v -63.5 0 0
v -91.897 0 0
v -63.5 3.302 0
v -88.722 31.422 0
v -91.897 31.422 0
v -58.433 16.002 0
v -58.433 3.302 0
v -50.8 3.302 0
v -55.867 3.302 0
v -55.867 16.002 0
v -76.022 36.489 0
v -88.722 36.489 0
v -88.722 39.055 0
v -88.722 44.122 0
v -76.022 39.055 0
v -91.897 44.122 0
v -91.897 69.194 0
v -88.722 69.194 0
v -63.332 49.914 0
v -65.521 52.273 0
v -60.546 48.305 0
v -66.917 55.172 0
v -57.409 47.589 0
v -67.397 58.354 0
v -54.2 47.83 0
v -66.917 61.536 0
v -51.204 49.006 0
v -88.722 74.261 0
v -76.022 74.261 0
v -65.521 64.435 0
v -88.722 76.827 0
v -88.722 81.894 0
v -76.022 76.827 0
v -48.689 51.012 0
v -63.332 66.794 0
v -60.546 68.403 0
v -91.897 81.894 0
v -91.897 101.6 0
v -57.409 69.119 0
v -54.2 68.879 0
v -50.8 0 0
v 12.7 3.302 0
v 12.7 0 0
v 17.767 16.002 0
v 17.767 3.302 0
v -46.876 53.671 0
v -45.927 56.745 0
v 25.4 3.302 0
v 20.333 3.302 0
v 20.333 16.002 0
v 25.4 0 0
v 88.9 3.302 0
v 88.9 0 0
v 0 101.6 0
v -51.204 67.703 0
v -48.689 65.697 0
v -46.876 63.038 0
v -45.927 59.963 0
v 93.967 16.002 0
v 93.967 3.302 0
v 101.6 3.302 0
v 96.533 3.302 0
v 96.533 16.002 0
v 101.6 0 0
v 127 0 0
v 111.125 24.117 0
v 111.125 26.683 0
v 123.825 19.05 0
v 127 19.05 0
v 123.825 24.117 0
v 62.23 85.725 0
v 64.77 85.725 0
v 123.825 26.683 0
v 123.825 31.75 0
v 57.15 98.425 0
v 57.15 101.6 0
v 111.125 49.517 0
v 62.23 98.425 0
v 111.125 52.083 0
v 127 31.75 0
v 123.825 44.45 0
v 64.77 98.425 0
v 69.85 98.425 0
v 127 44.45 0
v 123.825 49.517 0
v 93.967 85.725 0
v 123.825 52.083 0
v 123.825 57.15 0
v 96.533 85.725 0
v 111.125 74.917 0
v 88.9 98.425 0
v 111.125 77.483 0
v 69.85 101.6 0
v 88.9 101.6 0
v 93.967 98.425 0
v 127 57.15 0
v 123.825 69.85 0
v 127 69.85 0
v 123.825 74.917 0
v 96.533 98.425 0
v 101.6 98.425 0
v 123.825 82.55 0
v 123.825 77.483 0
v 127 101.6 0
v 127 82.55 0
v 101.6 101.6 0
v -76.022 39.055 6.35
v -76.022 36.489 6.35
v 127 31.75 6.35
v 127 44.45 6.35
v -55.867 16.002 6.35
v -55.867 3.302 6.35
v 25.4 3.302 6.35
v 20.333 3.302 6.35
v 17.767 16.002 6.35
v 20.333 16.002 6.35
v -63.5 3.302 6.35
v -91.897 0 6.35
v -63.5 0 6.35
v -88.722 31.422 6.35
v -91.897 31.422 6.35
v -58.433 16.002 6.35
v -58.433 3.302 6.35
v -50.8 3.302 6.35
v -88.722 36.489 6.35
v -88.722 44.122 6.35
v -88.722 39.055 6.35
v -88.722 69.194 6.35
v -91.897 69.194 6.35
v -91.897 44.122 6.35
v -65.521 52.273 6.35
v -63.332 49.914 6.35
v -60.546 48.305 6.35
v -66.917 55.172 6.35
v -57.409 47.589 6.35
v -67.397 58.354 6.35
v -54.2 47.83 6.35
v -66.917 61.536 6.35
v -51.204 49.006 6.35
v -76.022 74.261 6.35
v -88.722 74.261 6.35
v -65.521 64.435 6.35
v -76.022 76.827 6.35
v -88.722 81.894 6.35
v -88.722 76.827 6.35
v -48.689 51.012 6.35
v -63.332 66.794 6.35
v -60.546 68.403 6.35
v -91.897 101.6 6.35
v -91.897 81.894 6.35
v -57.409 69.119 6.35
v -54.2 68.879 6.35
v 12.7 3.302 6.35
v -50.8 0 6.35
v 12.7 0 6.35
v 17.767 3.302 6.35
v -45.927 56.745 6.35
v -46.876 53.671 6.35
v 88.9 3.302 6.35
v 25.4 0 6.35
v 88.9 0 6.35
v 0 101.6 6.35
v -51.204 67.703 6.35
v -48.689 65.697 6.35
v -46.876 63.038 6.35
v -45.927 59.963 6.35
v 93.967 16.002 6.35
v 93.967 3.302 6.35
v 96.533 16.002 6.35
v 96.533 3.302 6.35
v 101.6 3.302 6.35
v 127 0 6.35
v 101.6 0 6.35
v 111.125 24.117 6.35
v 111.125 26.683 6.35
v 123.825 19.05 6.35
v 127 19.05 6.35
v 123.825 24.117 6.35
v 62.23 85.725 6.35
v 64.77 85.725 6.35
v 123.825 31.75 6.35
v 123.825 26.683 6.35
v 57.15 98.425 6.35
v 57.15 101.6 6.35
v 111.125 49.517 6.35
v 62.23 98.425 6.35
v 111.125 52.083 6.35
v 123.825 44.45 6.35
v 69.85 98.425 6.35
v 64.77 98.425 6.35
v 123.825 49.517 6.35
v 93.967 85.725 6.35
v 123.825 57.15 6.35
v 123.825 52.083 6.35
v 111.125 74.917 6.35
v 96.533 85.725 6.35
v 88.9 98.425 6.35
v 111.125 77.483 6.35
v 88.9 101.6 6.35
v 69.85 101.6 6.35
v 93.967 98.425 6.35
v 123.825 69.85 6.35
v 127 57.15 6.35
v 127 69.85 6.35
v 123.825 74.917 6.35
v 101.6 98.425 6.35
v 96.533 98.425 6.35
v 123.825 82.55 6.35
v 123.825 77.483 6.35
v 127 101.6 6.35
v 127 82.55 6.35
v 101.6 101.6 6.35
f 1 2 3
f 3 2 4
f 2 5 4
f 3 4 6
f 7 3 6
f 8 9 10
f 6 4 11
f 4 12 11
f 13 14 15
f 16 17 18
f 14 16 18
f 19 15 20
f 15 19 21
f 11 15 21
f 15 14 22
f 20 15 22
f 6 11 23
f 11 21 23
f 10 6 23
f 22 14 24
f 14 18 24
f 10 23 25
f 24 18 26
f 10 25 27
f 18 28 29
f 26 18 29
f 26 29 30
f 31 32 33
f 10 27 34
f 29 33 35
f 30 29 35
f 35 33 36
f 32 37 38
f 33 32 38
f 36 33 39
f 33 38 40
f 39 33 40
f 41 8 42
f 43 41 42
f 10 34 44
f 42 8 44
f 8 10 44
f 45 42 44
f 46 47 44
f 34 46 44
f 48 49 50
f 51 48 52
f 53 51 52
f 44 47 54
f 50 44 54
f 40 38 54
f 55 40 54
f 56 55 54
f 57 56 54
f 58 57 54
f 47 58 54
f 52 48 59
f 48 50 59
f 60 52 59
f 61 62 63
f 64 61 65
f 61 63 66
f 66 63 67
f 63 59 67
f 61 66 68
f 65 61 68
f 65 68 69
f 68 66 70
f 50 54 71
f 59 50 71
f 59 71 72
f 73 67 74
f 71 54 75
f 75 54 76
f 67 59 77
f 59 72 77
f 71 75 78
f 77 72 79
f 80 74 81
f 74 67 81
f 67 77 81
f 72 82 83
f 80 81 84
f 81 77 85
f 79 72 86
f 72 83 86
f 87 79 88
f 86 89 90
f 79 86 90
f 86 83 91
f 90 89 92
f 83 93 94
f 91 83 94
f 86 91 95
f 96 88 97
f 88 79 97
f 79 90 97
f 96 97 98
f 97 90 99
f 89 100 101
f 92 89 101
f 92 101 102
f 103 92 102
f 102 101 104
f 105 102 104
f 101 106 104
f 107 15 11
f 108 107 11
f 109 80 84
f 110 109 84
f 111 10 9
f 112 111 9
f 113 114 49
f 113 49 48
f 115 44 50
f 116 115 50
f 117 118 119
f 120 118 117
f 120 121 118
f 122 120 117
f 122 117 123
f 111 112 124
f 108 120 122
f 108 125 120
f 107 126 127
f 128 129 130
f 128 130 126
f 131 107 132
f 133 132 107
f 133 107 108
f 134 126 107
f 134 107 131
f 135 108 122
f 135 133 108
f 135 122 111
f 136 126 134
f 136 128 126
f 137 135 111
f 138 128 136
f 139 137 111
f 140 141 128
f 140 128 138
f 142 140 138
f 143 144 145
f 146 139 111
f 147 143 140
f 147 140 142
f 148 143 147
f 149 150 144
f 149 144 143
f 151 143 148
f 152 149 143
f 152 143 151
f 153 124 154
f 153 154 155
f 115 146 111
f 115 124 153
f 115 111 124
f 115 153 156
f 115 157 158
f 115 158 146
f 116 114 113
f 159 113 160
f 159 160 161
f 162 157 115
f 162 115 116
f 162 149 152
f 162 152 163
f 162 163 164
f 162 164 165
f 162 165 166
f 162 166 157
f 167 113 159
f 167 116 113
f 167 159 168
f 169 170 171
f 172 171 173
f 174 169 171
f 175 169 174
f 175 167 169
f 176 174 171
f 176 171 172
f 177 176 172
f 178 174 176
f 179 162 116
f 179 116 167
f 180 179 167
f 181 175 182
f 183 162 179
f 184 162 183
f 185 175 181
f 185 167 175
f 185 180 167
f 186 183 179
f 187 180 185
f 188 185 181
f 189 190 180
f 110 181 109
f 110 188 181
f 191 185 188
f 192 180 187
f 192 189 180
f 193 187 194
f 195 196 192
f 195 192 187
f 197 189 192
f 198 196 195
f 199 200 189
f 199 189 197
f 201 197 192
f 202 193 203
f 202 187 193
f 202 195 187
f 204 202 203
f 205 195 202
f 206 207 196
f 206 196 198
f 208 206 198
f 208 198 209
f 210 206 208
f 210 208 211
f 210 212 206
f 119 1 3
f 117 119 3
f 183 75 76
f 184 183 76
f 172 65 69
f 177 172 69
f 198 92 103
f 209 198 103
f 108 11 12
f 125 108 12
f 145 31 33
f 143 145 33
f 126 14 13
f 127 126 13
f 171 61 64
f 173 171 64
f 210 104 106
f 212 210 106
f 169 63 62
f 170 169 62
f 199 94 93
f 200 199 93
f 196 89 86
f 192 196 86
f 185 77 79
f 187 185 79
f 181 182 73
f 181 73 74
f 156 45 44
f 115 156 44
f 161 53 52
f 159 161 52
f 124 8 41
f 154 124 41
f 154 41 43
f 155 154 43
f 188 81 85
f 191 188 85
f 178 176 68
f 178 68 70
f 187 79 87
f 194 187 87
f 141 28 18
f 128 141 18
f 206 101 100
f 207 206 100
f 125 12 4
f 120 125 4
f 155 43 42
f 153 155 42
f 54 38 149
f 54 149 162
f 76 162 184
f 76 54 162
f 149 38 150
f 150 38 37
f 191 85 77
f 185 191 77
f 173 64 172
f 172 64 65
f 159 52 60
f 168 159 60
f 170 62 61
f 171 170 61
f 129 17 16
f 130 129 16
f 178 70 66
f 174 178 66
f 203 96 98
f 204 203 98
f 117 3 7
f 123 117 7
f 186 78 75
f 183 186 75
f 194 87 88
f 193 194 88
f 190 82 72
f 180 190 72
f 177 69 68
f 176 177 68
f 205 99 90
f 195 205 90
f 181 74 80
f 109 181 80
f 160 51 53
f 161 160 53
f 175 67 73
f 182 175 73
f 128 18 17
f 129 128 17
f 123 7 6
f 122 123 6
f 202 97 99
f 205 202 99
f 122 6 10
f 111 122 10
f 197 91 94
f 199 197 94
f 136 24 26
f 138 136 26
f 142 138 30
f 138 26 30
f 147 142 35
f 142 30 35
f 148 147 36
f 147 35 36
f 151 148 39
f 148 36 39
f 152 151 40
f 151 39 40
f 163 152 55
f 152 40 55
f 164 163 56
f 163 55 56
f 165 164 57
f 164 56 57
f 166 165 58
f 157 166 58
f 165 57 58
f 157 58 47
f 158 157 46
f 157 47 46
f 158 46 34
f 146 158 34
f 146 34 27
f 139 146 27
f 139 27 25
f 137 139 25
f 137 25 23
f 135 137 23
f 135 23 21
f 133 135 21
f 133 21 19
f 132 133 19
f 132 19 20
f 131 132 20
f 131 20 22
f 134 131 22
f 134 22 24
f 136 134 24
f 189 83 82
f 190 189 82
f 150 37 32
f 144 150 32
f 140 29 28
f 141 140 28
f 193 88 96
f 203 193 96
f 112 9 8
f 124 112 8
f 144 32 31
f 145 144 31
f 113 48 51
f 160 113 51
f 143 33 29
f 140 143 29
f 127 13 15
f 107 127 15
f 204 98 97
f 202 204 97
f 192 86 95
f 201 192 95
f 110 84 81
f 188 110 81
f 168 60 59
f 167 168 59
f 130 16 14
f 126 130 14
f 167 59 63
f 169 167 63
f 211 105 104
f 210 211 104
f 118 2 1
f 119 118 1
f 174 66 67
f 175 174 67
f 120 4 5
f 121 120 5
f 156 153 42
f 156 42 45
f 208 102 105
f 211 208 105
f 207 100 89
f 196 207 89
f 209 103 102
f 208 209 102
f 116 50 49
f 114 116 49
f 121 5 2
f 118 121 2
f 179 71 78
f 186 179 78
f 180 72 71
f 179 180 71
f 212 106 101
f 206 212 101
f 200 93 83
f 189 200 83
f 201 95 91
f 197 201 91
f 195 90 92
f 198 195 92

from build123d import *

# Parameters (mm, degrees)
BOSS_EXTRUDE1_DEPTH     = 6.35
CUT_EXTRUDE4_DEPTH      = 127
CUT_EXTRUDE4_DEPTH_BACK = 127
CUT_EXTRUDE5_DEPTH      = 127
CUT_EXTRUDE5_DEPTH_BACK = 127
CUT_EXTRUDE7_DEPTH      = 127
CUT_EXTRUDE7_DEPTH_BACK = 127
SKETCH5_W               = 229.808362084
SKETCH5_H               = 77.917038349
CUT_EXTRUDE8_DEPTH      = 127
CUT_EXTRUDE8_DEPTH_BACK = 127
SKETCH6_R               = 10.795


with BuildPart() as part:
    # Sketch1 → Boss-Extrude1 (new body)
    with BuildSketch(Plane.XY):
        Polygon((0, 0), (127, 0), (127, 101.6), (0, 101.6), (-70.692427737, 172.292427737), (-91.896861793, 151.087993682), (-91.896861793, 0), align=None)
    extrude(amount=BOSS_EXTRUDE1_DEPTH)

    # Sketch3 → Cut-Extrude4 (cut, two sides: drawn at the far end of the back side and taken through both)
    with BuildSketch(Plane(origin=(0, 0, 0), x_dir=(-1, 0, 0), z_dir=(0, 0, -1)).offset(-CUT_EXTRUDE4_DEPTH_BACK)):
        Polygon((68.447363707, 161.067107586), (63.957235647, 156.576979525), (66.202299677, 154.331915495), (70.692427737, 158.822043556), align=None)
        Polygon((-127, 31.75), (-127, 19.05), (-123.825, 19.05), (-123.825, 24.1173), (-111.125, 24.1173), (-111.125, 26.6827), (-123.825, 26.6827), (-123.825, 31.75), align=None)
        Polygon((-57.15, 101.6), (-69.85, 101.6), (-69.85, 98.425), (-64.77, 98.425), (-64.77, 85.725), (-62.23, 85.725), (-62.23, 98.425), (-57.15, 98.425), align=None)
        Polygon((-88.9, 101.6), (-101.6, 101.6), (-101.6, 98.425), (-96.5327, 98.425), (-96.5327, 85.725), (-93.9673, 85.725), (-93.9673, 98.425), (-88.9, 98.425), align=None)
        Polygon((-127, 82.55), (-127, 69.85), (-123.825, 69.85), (-123.825, 74.9173), (-111.125, 74.9173), (-111.125, 77.4827), (-123.825, 77.4827), (-123.825, 82.55), align=None)
        Polygon((-127, 57.15), (-127, 44.45), (-123.825, 44.45), (-123.825, 49.5173), (-111.125, 49.5173), (-111.125, 52.0827), (-123.825, 52.0827), (-123.825, 57.15), align=None)
        Polygon((88.721861793, 106.965995261), (91.896861793, 106.965995261), (91.896861793, 119.665995261), (88.721861793, 119.665995261), (88.721861793, 114.598695261), (76.021861793, 114.598695261), (76.021861793, 112.033295261), (88.721861793, 112.033295261), align=None)
        Polygon((88.721861793, 69.193996841), (91.896861793, 69.193996841), (91.896861793, 81.893996841), (88.721861793, 81.893996841), (88.721861793, 76.826696841), (76.021861793, 76.826696841), (76.021861793, 74.261296841), (88.721861793, 74.261296841), align=None)
        Polygon((88.721861793, 31.42199842), (91.896861793, 31.42199842), (91.896861793, 44.12199842), (88.721861793, 44.12199842), (88.721861793, 39.05469842), (76.021861793, 39.05469842), (76.021861793, 36.48929842), (88.721861793, 36.48929842), align=None)
        Polygon((50.8, 3.302), (50.8, 0), (63.5, 0), (63.5, 3.302), (58.4327, 3.302), (58.4327, 16.002), (55.8673, 16.002), (55.8673, 3.302), align=None)
        Polygon((-25.4, 3.302), (-25.4, 0), (-12.7, 0), (-12.7, 3.302), (-17.7673, 3.302), (-17.7673, 16.002), (-20.3327, 16.002), (-20.3327, 3.302), align=None)
        Polygon((-101.6, 3.302), (-101.6, 0), (-88.9, 0), (-88.9, 3.302), (-93.9673, 3.302), (-93.9673, 16.002), (-96.5327, 16.002), (-96.5327, 3.302), align=None)
    extrude(amount=CUT_EXTRUDE4_DEPTH + CUT_EXTRUDE4_DEPTH_BACK, mode=Mode.SUBTRACT)

    # Sketch4 → Cut-Extrude5 (cut, two sides: drawn at the far end of the back side and taken through both)
    with BuildSketch(Plane.XY.offset(-CUT_EXTRUDE5_DEPTH_BACK)):
        Polygon((-81.917747889, 147.596723404), (-79.672683858, 149.841787435), (-75.182555798, 145.351659374), (-77.427619828, 143.106595344), align=None)
    extrude(amount=CUT_EXTRUDE5_DEPTH + CUT_EXTRUDE5_DEPTH_BACK, mode=Mode.SUBTRACT)

    # Sketch5 → Cut-Extrude7 (cut, two sides: drawn at the far end of the back side and taken through both)
    with BuildSketch(Plane.XY.offset(-CUT_EXTRUDE7_DEPTH_BACK)):
        with Locations((12.095818958, 140.558519175)):
            Rectangle(SKETCH5_W, SKETCH5_H)
    extrude(amount=CUT_EXTRUDE7_DEPTH + CUT_EXTRUDE7_DEPTH_BACK, mode=Mode.SUBTRACT)

    # Sketch6 → Cut-Extrude8 (cut, two sides: drawn at the far end of the back side and taken through both)
    with BuildSketch(Plane(origin=(0, 0, -2.54), x_dir=(-1, 0, 0), z_dir=(0, 0, -1)).offset(-CUT_EXTRUDE8_DEPTH_BACK)):
        with Locations((56.601909208, 58.354277065)):
            Circle(SKETCH6_R)
    extrude(amount=CUT_EXTRUDE8_DEPTH + CUT_EXTRUDE8_DEPTH_BACK, mode=Mode.SUBTRACT)


solid = part.part
